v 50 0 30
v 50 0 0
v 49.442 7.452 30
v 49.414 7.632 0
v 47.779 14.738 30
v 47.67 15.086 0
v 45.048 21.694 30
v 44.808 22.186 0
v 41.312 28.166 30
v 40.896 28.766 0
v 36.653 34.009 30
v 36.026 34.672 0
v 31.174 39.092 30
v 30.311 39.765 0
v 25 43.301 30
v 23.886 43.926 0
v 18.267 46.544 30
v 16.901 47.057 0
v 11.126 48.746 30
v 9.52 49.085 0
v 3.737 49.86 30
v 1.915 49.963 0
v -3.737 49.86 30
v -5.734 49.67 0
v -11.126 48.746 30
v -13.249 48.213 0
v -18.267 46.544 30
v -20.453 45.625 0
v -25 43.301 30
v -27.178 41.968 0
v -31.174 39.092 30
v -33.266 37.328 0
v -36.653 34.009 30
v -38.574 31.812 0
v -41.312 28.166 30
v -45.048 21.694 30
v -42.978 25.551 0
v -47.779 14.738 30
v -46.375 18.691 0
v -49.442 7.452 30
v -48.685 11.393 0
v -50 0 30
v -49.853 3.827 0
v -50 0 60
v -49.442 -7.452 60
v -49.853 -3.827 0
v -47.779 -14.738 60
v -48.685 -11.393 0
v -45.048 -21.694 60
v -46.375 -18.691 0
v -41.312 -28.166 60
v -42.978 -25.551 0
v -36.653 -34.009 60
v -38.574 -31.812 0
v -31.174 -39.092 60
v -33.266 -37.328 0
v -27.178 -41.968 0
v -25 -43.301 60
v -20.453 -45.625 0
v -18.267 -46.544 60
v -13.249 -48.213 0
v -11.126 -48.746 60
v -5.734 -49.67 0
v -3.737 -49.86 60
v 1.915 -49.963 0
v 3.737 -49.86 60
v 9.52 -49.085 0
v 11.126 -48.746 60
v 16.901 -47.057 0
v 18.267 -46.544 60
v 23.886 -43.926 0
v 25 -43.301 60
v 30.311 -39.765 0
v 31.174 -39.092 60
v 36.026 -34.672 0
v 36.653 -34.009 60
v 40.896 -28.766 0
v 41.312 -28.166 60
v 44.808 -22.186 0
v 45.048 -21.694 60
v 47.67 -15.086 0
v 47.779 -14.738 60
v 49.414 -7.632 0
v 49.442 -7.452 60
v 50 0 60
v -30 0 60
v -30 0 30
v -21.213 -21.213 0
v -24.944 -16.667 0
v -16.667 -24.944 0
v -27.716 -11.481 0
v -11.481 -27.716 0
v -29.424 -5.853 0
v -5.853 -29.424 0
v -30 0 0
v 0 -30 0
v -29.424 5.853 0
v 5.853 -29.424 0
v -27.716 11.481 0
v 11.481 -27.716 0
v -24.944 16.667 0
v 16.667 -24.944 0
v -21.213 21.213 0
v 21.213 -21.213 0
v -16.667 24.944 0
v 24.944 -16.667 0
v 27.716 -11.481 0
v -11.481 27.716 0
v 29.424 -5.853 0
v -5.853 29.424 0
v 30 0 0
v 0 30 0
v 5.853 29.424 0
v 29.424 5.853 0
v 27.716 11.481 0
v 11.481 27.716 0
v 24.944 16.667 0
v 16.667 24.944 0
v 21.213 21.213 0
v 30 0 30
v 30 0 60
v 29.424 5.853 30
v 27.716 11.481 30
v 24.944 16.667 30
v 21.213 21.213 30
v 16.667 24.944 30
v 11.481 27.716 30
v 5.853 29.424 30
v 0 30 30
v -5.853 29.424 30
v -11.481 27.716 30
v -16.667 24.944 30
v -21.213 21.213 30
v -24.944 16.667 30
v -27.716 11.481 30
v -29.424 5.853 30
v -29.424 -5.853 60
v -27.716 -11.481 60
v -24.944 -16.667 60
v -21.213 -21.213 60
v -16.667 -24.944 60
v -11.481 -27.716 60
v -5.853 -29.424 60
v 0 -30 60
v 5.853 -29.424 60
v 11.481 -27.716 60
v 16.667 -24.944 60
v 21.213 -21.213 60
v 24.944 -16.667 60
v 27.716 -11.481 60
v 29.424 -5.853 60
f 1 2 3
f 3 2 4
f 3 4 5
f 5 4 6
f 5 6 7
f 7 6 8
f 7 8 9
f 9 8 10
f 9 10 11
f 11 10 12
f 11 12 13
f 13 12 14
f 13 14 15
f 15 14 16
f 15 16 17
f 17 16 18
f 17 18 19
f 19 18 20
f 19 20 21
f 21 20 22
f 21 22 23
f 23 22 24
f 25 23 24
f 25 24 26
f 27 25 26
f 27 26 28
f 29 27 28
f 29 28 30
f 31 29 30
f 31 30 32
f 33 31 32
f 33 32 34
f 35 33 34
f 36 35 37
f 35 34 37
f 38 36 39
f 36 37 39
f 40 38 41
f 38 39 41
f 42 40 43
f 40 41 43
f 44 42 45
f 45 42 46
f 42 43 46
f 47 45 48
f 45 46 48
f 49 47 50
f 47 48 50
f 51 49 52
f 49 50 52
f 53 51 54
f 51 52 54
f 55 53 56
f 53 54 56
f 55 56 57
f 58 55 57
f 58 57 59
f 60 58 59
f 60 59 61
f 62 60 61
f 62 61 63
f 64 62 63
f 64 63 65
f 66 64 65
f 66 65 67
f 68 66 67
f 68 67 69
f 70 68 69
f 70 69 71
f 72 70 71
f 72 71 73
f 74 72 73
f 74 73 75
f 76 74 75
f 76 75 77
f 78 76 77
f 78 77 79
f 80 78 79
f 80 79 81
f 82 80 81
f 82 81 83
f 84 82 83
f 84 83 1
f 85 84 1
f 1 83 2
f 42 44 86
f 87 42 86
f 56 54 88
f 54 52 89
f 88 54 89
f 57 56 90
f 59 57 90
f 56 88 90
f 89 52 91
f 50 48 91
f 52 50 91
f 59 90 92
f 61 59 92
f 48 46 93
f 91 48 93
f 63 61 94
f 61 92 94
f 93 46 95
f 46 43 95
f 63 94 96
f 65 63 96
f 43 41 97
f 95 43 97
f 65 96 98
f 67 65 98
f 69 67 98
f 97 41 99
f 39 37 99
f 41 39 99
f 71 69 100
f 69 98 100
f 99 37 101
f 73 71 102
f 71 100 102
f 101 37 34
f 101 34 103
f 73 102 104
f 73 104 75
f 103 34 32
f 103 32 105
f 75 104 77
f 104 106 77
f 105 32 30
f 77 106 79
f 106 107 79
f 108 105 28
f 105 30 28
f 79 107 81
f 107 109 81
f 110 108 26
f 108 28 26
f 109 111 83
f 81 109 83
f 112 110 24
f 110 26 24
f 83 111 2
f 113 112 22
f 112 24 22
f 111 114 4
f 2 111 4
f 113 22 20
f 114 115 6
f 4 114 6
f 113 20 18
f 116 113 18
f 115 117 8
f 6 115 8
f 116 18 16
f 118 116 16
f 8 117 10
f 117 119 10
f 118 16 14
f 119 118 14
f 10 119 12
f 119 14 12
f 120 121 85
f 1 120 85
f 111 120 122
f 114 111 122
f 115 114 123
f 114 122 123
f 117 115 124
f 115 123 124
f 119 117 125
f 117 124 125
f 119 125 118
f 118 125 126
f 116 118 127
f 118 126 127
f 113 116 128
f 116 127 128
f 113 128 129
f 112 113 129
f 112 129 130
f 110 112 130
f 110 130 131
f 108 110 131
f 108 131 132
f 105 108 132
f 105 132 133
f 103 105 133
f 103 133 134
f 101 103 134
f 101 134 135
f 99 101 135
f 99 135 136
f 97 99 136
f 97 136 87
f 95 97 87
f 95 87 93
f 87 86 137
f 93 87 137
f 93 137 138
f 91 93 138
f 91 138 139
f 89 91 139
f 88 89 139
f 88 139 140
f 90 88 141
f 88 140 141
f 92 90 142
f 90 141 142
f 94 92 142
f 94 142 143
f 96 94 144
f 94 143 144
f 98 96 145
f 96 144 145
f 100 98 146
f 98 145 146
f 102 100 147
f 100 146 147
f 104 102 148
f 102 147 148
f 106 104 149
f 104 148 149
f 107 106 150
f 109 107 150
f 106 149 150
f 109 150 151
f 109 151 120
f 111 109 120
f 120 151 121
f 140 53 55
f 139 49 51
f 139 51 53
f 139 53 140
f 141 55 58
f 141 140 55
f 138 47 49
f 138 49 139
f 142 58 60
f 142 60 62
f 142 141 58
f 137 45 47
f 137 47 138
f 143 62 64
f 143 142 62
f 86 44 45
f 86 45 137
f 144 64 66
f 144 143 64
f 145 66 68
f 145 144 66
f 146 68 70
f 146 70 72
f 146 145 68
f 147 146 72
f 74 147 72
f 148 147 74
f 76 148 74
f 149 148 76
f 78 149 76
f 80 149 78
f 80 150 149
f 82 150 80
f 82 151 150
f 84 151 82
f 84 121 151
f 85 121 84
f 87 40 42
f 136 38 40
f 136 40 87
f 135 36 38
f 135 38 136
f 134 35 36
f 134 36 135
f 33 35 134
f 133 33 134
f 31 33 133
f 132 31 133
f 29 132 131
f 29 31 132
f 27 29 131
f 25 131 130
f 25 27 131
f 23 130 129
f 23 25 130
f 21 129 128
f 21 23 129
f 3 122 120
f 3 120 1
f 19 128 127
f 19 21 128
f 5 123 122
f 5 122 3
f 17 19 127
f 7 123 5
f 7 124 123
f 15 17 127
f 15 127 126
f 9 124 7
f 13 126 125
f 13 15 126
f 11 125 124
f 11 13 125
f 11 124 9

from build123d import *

# Parameters (mm, degrees)
SKETCH1_R           = 50
BOSS_EXTRUDE1_DEPTH = 60
SKETCH2_R           = 30
CUT_EXTRUDE1_DEPTH  = 60
CUT_EXTRUDE2_DEPTH  = 30


with BuildPart() as part:
    # Sketch1 → Boss-Extrude1 (new body)
    with BuildSketch(Plane.XY):
        Circle(SKETCH1_R)
    extrude(amount=BOSS_EXTRUDE1_DEPTH)

    # Sketch2 → Cut-Extrude1 (cut)
    with BuildSketch(Plane.XY.offset(60)):
        Circle(SKETCH2_R)
    extrude(amount=-CUT_EXTRUDE1_DEPTH, mode=Mode.SUBTRACT)

    # Sketch3 → Cut-Extrude2 (cut)
    with BuildSketch(Plane.XY.offset(60)):
        with BuildLine():
            Line((-50, 0), (-30, 0))
            ThreePointArc((-30, 0), (0, 30), (30, 0))
            Line((30, 0), (50, 0))
            ThreePointArc((50, 0), (0, 50), (-50, 0))
        make_face()
    extrude(amount=-CUT_EXTRUDE2_DEPTH, mode=Mode.SUBTRACT)


solid = part.part
